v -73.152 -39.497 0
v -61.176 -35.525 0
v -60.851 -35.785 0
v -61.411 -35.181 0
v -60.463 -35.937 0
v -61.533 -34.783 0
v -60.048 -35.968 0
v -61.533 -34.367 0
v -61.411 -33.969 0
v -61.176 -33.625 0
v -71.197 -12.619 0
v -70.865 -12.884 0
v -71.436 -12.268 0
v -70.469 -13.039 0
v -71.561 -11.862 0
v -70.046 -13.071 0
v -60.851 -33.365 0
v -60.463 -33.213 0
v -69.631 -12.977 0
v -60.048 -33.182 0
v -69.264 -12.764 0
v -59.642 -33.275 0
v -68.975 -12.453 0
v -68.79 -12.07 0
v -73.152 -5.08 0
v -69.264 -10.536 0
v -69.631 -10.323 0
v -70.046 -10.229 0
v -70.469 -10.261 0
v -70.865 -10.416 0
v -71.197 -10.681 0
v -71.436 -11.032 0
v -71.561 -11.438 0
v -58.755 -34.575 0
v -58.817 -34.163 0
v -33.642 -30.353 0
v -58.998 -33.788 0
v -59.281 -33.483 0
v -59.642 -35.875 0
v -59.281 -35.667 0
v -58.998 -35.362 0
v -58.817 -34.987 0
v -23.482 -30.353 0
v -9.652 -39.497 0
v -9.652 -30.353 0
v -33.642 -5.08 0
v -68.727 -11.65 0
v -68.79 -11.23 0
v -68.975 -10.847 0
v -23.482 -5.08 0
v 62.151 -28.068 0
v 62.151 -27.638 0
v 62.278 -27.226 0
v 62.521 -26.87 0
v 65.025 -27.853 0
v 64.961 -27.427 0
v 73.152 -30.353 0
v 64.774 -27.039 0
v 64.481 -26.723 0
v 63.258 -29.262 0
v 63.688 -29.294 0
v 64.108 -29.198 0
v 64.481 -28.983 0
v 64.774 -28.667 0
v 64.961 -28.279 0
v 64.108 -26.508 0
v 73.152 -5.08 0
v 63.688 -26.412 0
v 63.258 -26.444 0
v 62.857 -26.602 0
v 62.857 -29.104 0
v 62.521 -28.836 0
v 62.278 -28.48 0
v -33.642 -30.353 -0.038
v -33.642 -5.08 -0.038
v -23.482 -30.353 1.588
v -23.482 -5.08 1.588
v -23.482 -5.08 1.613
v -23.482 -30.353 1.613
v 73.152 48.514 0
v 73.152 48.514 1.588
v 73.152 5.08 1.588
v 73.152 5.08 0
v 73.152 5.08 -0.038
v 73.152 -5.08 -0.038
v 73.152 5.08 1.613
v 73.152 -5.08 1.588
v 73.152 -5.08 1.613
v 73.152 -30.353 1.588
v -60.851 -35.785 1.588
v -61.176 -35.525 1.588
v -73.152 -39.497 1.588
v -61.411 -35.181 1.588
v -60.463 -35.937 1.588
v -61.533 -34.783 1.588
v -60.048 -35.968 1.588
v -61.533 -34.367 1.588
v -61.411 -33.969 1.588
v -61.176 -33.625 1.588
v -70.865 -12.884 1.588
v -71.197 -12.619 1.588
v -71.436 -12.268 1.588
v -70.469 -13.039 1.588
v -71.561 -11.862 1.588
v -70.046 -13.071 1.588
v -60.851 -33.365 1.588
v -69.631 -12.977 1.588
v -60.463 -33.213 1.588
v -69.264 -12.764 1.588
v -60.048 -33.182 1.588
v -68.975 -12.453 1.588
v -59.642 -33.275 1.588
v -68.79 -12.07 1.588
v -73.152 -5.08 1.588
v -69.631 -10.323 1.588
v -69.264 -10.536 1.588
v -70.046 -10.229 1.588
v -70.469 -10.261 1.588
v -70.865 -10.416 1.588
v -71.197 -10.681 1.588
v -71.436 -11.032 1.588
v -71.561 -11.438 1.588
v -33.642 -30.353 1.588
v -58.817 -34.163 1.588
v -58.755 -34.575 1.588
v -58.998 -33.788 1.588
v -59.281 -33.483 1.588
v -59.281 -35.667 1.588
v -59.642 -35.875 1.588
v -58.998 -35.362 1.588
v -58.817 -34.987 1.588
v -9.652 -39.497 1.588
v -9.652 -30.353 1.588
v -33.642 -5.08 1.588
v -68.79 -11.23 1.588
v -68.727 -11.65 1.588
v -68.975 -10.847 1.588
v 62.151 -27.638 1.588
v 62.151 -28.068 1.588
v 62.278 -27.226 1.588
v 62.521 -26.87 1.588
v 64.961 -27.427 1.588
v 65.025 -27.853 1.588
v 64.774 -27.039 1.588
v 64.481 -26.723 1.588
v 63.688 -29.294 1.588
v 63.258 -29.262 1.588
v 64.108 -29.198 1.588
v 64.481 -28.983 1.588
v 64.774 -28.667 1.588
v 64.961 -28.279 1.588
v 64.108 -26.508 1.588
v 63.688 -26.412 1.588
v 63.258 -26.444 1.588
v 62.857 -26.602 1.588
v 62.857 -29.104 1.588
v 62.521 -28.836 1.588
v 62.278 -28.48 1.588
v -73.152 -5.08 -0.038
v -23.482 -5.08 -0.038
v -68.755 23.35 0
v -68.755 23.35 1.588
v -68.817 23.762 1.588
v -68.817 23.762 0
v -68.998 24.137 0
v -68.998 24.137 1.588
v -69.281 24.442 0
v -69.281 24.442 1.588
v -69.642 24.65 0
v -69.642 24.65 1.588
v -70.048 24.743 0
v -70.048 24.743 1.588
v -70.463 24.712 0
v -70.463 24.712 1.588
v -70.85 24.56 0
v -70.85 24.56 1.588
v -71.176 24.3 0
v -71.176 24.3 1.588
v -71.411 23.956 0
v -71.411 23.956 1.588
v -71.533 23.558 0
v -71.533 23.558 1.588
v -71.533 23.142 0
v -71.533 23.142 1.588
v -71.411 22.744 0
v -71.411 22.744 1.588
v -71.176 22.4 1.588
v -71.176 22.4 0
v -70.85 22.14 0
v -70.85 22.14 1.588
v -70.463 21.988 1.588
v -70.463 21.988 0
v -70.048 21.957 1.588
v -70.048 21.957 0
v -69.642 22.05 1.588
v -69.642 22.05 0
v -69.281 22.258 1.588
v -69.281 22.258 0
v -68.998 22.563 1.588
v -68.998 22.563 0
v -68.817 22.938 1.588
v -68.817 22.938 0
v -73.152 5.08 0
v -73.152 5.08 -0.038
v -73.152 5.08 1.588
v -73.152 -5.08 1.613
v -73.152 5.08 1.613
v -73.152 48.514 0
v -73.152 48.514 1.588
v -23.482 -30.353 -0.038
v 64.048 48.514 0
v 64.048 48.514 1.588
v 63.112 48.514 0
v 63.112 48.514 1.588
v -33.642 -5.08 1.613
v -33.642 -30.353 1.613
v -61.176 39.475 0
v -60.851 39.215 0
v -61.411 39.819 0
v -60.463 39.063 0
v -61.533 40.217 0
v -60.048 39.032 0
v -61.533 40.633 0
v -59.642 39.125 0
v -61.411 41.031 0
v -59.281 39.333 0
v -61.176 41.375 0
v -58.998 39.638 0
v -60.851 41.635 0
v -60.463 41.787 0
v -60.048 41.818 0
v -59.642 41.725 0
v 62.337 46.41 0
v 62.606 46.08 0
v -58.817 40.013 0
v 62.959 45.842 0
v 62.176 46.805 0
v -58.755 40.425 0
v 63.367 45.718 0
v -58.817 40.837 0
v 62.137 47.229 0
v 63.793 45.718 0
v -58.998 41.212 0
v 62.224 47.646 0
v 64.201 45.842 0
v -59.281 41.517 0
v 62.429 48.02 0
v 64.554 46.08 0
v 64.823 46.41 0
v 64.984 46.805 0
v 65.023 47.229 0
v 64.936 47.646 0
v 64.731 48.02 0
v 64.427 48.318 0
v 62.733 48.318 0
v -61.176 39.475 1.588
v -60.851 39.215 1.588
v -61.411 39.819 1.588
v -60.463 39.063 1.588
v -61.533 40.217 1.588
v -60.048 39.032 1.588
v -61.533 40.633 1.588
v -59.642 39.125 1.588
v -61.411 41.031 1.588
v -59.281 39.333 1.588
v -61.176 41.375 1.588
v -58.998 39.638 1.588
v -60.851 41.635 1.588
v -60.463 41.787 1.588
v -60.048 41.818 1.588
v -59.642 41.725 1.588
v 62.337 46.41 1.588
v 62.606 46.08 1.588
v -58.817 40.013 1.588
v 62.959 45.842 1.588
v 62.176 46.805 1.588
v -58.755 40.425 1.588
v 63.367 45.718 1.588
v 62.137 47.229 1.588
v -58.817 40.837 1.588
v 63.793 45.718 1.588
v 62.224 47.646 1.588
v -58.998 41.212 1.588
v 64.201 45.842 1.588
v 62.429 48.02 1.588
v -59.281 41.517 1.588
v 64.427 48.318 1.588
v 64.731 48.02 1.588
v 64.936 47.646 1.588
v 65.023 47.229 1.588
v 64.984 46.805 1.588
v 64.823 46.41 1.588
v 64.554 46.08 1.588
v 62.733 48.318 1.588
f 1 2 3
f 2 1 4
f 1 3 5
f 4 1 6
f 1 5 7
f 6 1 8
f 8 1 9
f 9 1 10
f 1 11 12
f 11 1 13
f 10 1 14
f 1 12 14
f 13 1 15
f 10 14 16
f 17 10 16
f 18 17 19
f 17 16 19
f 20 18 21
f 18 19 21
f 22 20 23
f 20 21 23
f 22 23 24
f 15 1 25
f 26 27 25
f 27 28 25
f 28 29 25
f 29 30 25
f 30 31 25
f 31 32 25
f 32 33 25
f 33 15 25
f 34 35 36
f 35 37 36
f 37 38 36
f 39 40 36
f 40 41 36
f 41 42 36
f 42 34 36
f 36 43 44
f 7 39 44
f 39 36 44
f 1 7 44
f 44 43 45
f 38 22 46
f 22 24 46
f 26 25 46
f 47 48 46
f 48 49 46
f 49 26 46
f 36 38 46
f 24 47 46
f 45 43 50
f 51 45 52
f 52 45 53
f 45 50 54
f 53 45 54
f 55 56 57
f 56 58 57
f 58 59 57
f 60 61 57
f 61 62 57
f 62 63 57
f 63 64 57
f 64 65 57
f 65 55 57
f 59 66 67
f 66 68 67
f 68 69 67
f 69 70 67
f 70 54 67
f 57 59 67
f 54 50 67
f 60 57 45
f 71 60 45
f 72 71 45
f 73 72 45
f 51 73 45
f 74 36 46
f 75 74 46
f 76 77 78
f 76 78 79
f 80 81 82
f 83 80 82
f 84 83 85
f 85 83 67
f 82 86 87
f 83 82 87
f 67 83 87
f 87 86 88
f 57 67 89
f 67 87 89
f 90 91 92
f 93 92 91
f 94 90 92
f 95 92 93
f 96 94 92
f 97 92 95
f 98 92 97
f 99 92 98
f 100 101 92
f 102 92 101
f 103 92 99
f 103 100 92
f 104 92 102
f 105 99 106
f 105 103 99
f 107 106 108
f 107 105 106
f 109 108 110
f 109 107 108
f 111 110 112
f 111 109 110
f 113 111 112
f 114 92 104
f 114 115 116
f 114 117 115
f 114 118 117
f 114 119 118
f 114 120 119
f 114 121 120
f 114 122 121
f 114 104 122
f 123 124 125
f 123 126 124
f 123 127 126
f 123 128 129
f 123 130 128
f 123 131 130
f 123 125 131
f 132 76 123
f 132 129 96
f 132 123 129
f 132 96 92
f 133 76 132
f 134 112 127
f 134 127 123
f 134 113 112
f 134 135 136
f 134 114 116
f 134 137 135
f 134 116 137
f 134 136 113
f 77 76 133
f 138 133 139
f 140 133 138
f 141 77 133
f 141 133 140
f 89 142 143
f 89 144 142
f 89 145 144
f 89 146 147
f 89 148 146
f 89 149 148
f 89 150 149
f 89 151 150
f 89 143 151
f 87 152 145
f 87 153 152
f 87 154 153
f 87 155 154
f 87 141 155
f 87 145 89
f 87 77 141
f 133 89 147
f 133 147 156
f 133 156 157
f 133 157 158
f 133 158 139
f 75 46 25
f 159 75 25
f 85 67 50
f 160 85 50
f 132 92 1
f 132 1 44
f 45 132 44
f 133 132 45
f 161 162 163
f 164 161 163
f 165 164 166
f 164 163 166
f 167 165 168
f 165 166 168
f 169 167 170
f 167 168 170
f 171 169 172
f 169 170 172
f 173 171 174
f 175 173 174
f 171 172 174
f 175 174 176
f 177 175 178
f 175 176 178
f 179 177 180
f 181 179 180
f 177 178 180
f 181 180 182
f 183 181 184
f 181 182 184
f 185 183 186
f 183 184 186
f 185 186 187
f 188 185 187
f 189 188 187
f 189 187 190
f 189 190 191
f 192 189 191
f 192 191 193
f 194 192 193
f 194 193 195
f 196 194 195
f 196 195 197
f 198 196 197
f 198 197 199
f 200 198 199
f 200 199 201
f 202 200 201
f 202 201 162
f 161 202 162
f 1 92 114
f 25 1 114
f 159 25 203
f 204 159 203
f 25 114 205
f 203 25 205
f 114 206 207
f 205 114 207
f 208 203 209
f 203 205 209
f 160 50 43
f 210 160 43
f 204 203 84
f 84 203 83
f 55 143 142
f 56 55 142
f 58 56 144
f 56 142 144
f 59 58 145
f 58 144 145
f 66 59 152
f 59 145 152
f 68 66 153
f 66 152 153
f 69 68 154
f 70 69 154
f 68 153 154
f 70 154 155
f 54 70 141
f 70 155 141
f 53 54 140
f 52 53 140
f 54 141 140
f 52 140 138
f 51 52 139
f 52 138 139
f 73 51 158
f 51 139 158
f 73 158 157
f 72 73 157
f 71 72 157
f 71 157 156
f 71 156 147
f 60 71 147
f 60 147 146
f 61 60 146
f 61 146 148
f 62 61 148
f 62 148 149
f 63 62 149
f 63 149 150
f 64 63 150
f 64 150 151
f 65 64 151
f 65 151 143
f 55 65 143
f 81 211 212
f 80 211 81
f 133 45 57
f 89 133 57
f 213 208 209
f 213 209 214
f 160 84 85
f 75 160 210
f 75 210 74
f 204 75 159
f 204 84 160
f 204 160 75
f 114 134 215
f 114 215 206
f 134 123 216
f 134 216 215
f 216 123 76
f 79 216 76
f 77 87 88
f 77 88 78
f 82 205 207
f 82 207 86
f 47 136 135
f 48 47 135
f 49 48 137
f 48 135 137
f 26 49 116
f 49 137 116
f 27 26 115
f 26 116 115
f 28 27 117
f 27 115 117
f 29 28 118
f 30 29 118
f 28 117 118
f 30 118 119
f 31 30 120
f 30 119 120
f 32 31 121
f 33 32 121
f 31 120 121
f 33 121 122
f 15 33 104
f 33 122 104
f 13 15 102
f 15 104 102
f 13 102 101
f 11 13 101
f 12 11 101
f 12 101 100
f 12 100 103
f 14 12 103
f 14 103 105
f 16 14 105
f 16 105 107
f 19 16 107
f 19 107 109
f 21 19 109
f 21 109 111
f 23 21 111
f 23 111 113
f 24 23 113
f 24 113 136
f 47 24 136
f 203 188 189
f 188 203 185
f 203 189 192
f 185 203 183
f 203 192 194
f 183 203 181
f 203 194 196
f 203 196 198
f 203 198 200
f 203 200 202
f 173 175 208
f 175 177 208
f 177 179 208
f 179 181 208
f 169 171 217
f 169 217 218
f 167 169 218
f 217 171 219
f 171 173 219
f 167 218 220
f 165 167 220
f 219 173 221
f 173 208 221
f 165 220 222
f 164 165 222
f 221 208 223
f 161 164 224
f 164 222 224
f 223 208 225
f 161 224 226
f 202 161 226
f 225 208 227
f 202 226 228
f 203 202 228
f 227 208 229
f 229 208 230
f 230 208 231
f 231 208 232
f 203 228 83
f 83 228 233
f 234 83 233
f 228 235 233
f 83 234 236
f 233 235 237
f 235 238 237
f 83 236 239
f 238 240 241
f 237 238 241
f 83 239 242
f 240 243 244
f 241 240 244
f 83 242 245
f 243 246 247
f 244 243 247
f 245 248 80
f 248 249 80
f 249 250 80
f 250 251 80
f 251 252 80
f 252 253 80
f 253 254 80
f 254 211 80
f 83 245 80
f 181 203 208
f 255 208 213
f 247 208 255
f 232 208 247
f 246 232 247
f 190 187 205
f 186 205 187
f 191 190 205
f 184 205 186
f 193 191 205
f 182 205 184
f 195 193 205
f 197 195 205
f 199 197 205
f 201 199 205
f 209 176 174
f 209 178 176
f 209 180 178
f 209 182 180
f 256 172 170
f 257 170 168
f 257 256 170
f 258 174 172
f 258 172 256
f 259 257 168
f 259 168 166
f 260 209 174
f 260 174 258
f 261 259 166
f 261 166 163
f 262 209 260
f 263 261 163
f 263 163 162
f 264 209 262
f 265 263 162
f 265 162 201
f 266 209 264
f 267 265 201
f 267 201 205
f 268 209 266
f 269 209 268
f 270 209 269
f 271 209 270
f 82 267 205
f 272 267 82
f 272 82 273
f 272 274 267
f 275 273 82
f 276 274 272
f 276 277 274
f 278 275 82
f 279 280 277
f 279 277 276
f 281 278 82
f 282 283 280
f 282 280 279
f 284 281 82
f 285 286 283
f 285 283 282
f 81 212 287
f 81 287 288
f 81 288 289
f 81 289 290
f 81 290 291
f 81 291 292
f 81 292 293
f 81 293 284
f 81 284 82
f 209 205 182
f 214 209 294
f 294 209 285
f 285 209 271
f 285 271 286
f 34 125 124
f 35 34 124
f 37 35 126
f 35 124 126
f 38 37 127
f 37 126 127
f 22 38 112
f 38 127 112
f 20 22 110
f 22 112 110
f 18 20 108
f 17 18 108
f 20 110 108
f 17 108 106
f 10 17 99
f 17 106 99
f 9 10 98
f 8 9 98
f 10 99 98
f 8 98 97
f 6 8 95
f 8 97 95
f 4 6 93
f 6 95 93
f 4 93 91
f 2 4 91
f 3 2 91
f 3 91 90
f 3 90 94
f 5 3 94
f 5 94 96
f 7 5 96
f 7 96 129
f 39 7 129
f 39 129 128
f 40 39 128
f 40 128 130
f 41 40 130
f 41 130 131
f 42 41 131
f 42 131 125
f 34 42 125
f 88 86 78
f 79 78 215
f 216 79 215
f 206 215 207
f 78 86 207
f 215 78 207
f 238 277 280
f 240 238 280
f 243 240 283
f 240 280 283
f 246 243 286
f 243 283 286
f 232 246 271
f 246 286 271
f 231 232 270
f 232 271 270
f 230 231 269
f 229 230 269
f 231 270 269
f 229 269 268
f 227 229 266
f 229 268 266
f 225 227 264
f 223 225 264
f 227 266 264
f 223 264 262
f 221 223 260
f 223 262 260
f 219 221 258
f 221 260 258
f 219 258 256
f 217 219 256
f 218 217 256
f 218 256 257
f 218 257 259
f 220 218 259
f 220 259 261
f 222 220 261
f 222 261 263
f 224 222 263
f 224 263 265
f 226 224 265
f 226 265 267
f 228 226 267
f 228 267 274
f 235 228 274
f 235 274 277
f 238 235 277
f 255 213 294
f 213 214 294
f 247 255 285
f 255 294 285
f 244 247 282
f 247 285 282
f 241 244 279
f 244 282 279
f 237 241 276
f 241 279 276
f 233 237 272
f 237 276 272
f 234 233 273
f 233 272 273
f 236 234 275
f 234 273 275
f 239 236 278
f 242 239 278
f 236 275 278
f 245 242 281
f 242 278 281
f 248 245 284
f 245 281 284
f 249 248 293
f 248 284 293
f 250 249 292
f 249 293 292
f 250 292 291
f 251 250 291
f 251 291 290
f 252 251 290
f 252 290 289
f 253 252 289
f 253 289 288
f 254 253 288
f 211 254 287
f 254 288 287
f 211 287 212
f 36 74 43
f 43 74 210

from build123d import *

# Parameters (mm, degrees)
SKETCH1_W                = 146.304
SKETCH1_H                = 78.867
BOSS_EXTRUDE1_DEPTH      = 1.5875
BOSS_EXTRUDE2_DEPTH      = 0.0254
BOSS_EXTRUDE2_DEPTH_BACK = 1.6254
SKETCH5_R                = 1.445
CUT_EXTRUDE1_DEPTH       = 2.6254
SKETCH7_W                = 63.5
SKETCH7_H                = 9.144
BOSS_EXTRUDE3_DEPTH      = 1.5875
SKETCH6_R                = 1.397
SKETCH6_R_2              = 1.425015072
CUT_EXTRUDE2_DEPTH       = 2.6254


with BuildPart() as part:
    # Sketch1 → Boss-Extrude1 (new body)
    with BuildSketch(Plane.XY):
        with Locations((0, 9.0805)):
            Rectangle(SKETCH1_W, SKETCH1_H)
    extrude(amount=BOSS_EXTRUDE1_DEPTH)

    # Sketch4 → Boss-Extrude2 (add, two sides)
    with BuildSketch(Plane.XY.offset(1.5875)) as boss_extrude2_sk:
        Polygon((-73.152, 5.08), (73.152, 5.08), (73.152, -5.08), (-23.4823, -5.08), (-23.4823, -30.353), (-33.6423, -30.353), (-33.6423, -5.08), (-73.152, -5.08), align=None)
    extrude(amount=BOSS_EXTRUDE2_DEPTH)
    extrude(boss_extrude2_sk.sketch, amount=-BOSS_EXTRUDE2_DEPTH_BACK)

    # Sketch5 → Cut-Extrude1 (cut, through all)
    with BuildSketch(Plane.XY.offset(1.5875)):
        with Locations((63.58, 47.147)):
            Circle(SKETCH5_R)
        with Locations((63.58, -27.853)):
            Circle(SKETCH5_R)
    extrude(amount=-CUT_EXTRUDE1_DEPTH, mode=Mode.SUBTRACT)

    # Sketch7 → Boss-Extrude3 (add)
    with BuildSketch(Plane.XY.offset(1.5875)):
        with Locations((-41.402, -34.925)):
            Rectangle(SKETCH7_W, SKETCH7_H)
    extrude(amount=-BOSS_EXTRUDE3_DEPTH)

    # Sketch6 → Cut-Extrude2 (cut, through all)
    with BuildSketch(Plane.XY.offset(1.5875)):
        with Locations((-70.152, 23.35)):
            Circle(SKETCH6_R)
        with Locations((-70.152, -11.65)):
            Circle(SKETCH6_R_2)
        with Locations((-60.152, 40.424999886)):
            Circle(SKETCH6_R)
        with Locations((-60.152, -34.575)):
            Circle(SKETCH6_R)
    extrude(amount=-CUT_EXTRUDE2_DEPTH, mode=Mode.SUBTRACT)


solid = part.part
